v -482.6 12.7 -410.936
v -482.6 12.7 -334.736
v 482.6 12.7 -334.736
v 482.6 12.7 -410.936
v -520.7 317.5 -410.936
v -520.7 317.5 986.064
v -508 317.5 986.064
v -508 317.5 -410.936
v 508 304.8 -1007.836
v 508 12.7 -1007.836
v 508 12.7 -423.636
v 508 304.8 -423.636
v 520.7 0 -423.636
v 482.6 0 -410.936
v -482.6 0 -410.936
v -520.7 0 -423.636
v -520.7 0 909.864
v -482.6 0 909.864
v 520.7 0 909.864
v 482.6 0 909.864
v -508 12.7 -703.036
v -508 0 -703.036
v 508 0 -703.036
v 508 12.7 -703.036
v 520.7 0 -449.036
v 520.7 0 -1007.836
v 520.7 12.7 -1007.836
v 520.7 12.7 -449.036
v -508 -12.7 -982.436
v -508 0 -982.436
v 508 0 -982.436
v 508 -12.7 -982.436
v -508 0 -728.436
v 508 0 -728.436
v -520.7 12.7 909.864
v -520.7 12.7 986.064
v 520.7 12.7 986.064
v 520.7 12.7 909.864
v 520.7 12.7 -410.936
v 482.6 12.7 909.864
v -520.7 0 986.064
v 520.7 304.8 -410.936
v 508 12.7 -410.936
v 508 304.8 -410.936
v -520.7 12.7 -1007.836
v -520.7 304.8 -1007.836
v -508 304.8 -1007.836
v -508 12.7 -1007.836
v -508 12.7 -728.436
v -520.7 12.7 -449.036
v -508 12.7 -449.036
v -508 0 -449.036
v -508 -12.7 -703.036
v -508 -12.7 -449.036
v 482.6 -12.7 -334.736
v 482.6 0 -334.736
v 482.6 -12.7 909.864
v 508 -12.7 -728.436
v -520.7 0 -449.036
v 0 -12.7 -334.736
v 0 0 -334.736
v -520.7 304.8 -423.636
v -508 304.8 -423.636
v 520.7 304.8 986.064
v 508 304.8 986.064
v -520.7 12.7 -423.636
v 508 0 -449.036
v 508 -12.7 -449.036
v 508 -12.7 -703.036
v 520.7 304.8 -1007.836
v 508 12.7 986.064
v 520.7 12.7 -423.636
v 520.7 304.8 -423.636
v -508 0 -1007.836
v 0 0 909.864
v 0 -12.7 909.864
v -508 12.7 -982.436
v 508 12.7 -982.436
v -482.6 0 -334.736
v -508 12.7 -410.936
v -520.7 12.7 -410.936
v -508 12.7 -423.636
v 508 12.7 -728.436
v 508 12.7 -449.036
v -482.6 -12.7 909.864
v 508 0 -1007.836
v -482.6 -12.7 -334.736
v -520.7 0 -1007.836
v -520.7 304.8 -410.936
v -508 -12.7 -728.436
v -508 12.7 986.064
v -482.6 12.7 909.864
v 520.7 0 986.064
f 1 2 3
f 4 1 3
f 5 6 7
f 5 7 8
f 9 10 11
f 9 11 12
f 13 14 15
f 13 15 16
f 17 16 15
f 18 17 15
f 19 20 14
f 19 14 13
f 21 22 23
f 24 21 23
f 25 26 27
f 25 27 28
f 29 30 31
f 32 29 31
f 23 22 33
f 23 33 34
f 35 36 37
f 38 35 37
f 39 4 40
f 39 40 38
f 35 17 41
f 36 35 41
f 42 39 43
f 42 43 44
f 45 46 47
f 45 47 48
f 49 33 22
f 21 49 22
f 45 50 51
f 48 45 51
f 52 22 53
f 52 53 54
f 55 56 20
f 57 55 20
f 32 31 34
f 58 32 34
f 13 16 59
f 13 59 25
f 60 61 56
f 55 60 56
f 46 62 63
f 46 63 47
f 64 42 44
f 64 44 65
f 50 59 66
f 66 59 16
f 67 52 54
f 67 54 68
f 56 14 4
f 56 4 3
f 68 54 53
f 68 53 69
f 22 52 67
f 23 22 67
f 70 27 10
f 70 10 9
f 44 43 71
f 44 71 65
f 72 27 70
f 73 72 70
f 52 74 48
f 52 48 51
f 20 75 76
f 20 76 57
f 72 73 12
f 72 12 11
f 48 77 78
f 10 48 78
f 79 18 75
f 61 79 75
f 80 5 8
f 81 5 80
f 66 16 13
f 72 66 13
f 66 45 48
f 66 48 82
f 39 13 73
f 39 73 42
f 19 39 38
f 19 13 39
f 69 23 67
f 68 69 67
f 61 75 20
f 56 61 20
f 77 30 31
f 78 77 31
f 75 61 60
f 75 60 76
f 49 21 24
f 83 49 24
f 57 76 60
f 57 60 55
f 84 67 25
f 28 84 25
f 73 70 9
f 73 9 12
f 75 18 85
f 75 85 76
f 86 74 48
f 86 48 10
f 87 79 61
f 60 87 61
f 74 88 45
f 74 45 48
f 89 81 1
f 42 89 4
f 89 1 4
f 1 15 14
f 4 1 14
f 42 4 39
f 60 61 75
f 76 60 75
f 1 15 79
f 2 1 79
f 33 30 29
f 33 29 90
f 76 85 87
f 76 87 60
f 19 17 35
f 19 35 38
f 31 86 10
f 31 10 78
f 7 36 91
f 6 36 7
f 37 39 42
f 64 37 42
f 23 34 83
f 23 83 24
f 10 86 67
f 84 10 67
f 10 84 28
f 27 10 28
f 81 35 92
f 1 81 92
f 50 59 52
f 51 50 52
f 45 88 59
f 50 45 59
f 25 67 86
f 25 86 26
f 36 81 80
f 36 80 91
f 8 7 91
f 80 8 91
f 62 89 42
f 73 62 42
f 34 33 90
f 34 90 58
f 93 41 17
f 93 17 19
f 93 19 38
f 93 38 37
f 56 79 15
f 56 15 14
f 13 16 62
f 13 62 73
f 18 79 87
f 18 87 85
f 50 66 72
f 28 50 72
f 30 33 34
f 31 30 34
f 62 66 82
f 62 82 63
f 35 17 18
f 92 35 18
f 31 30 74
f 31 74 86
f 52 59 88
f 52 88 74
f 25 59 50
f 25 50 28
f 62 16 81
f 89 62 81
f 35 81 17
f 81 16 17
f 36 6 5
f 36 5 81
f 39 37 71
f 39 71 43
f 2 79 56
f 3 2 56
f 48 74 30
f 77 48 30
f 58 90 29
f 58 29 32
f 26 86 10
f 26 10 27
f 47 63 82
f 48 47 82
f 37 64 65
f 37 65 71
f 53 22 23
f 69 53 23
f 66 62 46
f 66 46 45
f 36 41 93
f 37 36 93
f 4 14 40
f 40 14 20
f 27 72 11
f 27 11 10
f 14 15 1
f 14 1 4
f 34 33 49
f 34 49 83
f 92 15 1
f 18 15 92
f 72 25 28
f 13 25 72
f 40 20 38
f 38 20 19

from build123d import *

# Parameters (mm, degrees)
F0_W      = 482.6
F0_H      = 1244.6
F1_DEPTH  = 12.7
F2_W      = 1016
F2_H      = 330.2
F3_DEPTH  = 12.7
F4_W      = 254
F4_H      = 1016
F5_DEPTH  = 12.7
F15_W     = 1016
F15_H     = 254
F23_DEPTH = 12.7
F13_W     = 1016
F13_H     = 254
F18_W     = 482.6
F18_H     = 1244.6
F19_W     = 482.6
F19_H     = 1244.6
F10_W     = 1041.4
F10_H     = 25.4
F24_DEPTH = 12.7
F17_W     = 965.2
F17_H     = 76.2
F14_W     = 1016
F14_H     = 25.4
F16_W     = 1016
F16_H     = 25.4
F22_W     = 1041.4
F22_H     = 76.2
F25_DEPTH = 12.7
F9_W      = 1041.4
F9_H      = 12.7
F26_DEPTH = 304.8
F12_W     = 12.7
F12_H     = 558.8
F11_W     = 12.7
F11_H     = 558.8
F27_DEPTH = 12.7
F20_W     = 38.1
F20_H     = 1320.8
F21_W     = 38.1
F21_H     = 1320.8
F29_DEPTH = 12.7
F31_DEPTH = 12.7
F33_DEPTH = 12.7
F35_DEPTH = 12.7


with BuildPart() as f1:
    # F0 (on Front) → F1 (new body)
    with BuildSketch(Plane.XZ):
        with Locations((-241.3, 216.6910535211)):
            Rectangle(F0_W, F0_H)
    extrude(amount=F1_DEPTH)


with BuildPart() as f3:
    # F2 (on Front) → F3 (new body)
    with BuildSketch(Plane.XZ):
        with Locations((630.2524805069, -146.5007268127)):
            Rectangle(F2_W, F2_H)
    extrude(amount=F3_DEPTH)


with BuildPart() as f5:
    # F4 (on Front) → F5 (new body)
    with BuildSketch(Plane.XZ):
        with Locations((652.4603366852, 1200.6871450653)):
            Rectangle(F4_W, F4_H)
    extrude(amount=F5_DEPTH)


with BuildPart() as f23:
    # F15 (on Front) → F23 (new body)
    with BuildSketch(Plane.XZ):
        with Locations((0, -855.4361613412)):
            Rectangle(F15_W, F15_H)
    extrude(amount=F23_DEPTH)


with BuildPart() as f23b:
    # F13 (on Front) → F23, piece 2 (new body)
    with BuildSketch(Plane.XZ):
        with Locations((0, -576.0361613412)):
            Rectangle(F13_W, F13_H)
    extrude(amount=F23_DEPTH)


with BuildPart() as f23c:
    # F18 (on Front) → F23, piece 3 (new body)
    with BuildSketch(Plane.XZ):
        with Locations((-241.3, 287.5638386588)):
            Rectangle(F18_W, F18_H)
    extrude(amount=F23_DEPTH)


with BuildPart() as f23d:
    # F19 (on Front) → F23, piece 4 (new body)
    with BuildSketch(Plane.XZ):
        with Locations((241.3, 287.5638386588)):
            Rectangle(F19_W, F19_H)
    extrude(amount=F23_DEPTH)


with BuildPart() as f24:
    # F10 (on Front) → F24 (new body)
    with BuildSketch(Plane.XZ):
        with Locations((0, -436.3361613412)):
            Rectangle(F10_W, F10_H)
    extrude(amount=-F24_DEPTH)


with BuildPart() as f24b:
    # F17 (on Front) → F24, piece 2 (new body)
    with BuildSketch(Plane.XZ):
        with Locations((0, -372.8361613412)):
            Rectangle(F17_W, F17_H)
    extrude(amount=-F24_DEPTH)


with BuildPart() as f24c:
    # F14 (on Front) → F24, piece 3 (new body)
    with BuildSketch(Plane.XZ):
        with Locations((0, -715.7361613412)):
            Rectangle(F14_W, F14_H)
    extrude(amount=-F24_DEPTH)


with BuildPart() as f24d:
    # F16 (on Front) → F24, piece 4 (new body)
    with BuildSketch(Plane.XZ):
        with Locations((0, -995.1361613412)):
            Rectangle(F16_W, F16_H)
    extrude(amount=-F24_DEPTH)


with BuildPart() as f25:
    # F22 (on Front) → F25 (new body)
    with BuildSketch(Plane.XZ):
        with Locations((0, 947.9638386588)):
            Rectangle(F22_W, F22_H)
    extrude(amount=-F25_DEPTH)


with BuildPart() as f26:
    # F9 (on Front) → F26 (new body)
    with BuildSketch(Plane.XZ):
        with Locations((0, -417.2861613412)):
            Rectangle(F9_W, F9_H)
    extrude(amount=-F26_DEPTH)

    # F20 (on Front) + F21 (on Front) → F27, piece 2 (join)
    with BuildSketch(Plane.XZ):
        with Locations((-501.65, 249.4638386588)):
            Rectangle(F20_W, F20_H)
    with BuildSketch(Plane.XZ):
        with Locations((501.65, 249.4638386588)):
            Rectangle(F21_W, F21_H)
    extrude(amount=-F27_DEPTH)


with BuildPart() as f27:
    # F12 (on Front) + F11 (on Front) → F27 (new body)
    with BuildSketch(Plane.XZ):
        with Locations((514.35, -728.4361613412)):
            Rectangle(F12_W, F12_H)
    with BuildSketch(Plane.XZ):
        with Locations((-514.35, -728.4361613412)):
            Rectangle(F11_W, F11_H)
    extrude(amount=-F27_DEPTH)


with BuildPart() as f29:
    # F28 (on face) → F29 (new body)
    with BuildSketch(Plane.YZ.offset(520.7)):
        Polygon((304.8, -423.6361613412), (12.7, -423.6361613412), (12.7, -449.0361613412), (12.7, -1007.8361613412), (304.8, -1007.8361613412), align=None)
    extrude(amount=-F29_DEPTH)


with BuildPart() as f31:
    # F30 (on face) → F31 (new body)
    with BuildSketch(Plane(origin=(-520.7, 0, 0), x_dir=(0, -1, 0), z_dir=(-1, 0, 0))):
        Polygon((-12.7, -449.0361613412), (-12.7, -423.6361613412), (-304.8, -423.6361613412), (-304.8, -1007.8361613412), (-12.7, -1007.8361613412), align=None)
    extrude(amount=-F31_DEPTH)


with BuildPart() as f33:
    # F32 (on face) → F33 (new body)
    with BuildSketch(Plane(origin=(-520.7, 0, 0), x_dir=(0, -1, 0), z_dir=(-1, 0, 0))):
        Polygon((-12.7, 909.8638386588), (-12.7, 986.0638386588), (-317.5, 986.0638386588), (-317.5, -410.9361613412), (-12.7, -410.9361613412), align=None)
    extrude(amount=-F33_DEPTH)


with BuildPart() as f35:
    # F34 (on face) → F35 (new body)
    with BuildSketch(Plane.YZ.offset(520.7)):
        Polygon((304.8, 986.0638386588), (12.7, 986.0638386588), (12.7, 909.8638386588), (12.7, -410.9361613412), (304.8, -410.9361613412), align=None)
    extrude(amount=-F35_DEPTH)


solid = Compound([f23.part, f23b.part, f23c.part, f23d.part, f24.part, f24b.part, f24c.part, f24d.part, f25.part, f26.part, f27.part, f29.part, f31.part, f33.part, f35.part])
